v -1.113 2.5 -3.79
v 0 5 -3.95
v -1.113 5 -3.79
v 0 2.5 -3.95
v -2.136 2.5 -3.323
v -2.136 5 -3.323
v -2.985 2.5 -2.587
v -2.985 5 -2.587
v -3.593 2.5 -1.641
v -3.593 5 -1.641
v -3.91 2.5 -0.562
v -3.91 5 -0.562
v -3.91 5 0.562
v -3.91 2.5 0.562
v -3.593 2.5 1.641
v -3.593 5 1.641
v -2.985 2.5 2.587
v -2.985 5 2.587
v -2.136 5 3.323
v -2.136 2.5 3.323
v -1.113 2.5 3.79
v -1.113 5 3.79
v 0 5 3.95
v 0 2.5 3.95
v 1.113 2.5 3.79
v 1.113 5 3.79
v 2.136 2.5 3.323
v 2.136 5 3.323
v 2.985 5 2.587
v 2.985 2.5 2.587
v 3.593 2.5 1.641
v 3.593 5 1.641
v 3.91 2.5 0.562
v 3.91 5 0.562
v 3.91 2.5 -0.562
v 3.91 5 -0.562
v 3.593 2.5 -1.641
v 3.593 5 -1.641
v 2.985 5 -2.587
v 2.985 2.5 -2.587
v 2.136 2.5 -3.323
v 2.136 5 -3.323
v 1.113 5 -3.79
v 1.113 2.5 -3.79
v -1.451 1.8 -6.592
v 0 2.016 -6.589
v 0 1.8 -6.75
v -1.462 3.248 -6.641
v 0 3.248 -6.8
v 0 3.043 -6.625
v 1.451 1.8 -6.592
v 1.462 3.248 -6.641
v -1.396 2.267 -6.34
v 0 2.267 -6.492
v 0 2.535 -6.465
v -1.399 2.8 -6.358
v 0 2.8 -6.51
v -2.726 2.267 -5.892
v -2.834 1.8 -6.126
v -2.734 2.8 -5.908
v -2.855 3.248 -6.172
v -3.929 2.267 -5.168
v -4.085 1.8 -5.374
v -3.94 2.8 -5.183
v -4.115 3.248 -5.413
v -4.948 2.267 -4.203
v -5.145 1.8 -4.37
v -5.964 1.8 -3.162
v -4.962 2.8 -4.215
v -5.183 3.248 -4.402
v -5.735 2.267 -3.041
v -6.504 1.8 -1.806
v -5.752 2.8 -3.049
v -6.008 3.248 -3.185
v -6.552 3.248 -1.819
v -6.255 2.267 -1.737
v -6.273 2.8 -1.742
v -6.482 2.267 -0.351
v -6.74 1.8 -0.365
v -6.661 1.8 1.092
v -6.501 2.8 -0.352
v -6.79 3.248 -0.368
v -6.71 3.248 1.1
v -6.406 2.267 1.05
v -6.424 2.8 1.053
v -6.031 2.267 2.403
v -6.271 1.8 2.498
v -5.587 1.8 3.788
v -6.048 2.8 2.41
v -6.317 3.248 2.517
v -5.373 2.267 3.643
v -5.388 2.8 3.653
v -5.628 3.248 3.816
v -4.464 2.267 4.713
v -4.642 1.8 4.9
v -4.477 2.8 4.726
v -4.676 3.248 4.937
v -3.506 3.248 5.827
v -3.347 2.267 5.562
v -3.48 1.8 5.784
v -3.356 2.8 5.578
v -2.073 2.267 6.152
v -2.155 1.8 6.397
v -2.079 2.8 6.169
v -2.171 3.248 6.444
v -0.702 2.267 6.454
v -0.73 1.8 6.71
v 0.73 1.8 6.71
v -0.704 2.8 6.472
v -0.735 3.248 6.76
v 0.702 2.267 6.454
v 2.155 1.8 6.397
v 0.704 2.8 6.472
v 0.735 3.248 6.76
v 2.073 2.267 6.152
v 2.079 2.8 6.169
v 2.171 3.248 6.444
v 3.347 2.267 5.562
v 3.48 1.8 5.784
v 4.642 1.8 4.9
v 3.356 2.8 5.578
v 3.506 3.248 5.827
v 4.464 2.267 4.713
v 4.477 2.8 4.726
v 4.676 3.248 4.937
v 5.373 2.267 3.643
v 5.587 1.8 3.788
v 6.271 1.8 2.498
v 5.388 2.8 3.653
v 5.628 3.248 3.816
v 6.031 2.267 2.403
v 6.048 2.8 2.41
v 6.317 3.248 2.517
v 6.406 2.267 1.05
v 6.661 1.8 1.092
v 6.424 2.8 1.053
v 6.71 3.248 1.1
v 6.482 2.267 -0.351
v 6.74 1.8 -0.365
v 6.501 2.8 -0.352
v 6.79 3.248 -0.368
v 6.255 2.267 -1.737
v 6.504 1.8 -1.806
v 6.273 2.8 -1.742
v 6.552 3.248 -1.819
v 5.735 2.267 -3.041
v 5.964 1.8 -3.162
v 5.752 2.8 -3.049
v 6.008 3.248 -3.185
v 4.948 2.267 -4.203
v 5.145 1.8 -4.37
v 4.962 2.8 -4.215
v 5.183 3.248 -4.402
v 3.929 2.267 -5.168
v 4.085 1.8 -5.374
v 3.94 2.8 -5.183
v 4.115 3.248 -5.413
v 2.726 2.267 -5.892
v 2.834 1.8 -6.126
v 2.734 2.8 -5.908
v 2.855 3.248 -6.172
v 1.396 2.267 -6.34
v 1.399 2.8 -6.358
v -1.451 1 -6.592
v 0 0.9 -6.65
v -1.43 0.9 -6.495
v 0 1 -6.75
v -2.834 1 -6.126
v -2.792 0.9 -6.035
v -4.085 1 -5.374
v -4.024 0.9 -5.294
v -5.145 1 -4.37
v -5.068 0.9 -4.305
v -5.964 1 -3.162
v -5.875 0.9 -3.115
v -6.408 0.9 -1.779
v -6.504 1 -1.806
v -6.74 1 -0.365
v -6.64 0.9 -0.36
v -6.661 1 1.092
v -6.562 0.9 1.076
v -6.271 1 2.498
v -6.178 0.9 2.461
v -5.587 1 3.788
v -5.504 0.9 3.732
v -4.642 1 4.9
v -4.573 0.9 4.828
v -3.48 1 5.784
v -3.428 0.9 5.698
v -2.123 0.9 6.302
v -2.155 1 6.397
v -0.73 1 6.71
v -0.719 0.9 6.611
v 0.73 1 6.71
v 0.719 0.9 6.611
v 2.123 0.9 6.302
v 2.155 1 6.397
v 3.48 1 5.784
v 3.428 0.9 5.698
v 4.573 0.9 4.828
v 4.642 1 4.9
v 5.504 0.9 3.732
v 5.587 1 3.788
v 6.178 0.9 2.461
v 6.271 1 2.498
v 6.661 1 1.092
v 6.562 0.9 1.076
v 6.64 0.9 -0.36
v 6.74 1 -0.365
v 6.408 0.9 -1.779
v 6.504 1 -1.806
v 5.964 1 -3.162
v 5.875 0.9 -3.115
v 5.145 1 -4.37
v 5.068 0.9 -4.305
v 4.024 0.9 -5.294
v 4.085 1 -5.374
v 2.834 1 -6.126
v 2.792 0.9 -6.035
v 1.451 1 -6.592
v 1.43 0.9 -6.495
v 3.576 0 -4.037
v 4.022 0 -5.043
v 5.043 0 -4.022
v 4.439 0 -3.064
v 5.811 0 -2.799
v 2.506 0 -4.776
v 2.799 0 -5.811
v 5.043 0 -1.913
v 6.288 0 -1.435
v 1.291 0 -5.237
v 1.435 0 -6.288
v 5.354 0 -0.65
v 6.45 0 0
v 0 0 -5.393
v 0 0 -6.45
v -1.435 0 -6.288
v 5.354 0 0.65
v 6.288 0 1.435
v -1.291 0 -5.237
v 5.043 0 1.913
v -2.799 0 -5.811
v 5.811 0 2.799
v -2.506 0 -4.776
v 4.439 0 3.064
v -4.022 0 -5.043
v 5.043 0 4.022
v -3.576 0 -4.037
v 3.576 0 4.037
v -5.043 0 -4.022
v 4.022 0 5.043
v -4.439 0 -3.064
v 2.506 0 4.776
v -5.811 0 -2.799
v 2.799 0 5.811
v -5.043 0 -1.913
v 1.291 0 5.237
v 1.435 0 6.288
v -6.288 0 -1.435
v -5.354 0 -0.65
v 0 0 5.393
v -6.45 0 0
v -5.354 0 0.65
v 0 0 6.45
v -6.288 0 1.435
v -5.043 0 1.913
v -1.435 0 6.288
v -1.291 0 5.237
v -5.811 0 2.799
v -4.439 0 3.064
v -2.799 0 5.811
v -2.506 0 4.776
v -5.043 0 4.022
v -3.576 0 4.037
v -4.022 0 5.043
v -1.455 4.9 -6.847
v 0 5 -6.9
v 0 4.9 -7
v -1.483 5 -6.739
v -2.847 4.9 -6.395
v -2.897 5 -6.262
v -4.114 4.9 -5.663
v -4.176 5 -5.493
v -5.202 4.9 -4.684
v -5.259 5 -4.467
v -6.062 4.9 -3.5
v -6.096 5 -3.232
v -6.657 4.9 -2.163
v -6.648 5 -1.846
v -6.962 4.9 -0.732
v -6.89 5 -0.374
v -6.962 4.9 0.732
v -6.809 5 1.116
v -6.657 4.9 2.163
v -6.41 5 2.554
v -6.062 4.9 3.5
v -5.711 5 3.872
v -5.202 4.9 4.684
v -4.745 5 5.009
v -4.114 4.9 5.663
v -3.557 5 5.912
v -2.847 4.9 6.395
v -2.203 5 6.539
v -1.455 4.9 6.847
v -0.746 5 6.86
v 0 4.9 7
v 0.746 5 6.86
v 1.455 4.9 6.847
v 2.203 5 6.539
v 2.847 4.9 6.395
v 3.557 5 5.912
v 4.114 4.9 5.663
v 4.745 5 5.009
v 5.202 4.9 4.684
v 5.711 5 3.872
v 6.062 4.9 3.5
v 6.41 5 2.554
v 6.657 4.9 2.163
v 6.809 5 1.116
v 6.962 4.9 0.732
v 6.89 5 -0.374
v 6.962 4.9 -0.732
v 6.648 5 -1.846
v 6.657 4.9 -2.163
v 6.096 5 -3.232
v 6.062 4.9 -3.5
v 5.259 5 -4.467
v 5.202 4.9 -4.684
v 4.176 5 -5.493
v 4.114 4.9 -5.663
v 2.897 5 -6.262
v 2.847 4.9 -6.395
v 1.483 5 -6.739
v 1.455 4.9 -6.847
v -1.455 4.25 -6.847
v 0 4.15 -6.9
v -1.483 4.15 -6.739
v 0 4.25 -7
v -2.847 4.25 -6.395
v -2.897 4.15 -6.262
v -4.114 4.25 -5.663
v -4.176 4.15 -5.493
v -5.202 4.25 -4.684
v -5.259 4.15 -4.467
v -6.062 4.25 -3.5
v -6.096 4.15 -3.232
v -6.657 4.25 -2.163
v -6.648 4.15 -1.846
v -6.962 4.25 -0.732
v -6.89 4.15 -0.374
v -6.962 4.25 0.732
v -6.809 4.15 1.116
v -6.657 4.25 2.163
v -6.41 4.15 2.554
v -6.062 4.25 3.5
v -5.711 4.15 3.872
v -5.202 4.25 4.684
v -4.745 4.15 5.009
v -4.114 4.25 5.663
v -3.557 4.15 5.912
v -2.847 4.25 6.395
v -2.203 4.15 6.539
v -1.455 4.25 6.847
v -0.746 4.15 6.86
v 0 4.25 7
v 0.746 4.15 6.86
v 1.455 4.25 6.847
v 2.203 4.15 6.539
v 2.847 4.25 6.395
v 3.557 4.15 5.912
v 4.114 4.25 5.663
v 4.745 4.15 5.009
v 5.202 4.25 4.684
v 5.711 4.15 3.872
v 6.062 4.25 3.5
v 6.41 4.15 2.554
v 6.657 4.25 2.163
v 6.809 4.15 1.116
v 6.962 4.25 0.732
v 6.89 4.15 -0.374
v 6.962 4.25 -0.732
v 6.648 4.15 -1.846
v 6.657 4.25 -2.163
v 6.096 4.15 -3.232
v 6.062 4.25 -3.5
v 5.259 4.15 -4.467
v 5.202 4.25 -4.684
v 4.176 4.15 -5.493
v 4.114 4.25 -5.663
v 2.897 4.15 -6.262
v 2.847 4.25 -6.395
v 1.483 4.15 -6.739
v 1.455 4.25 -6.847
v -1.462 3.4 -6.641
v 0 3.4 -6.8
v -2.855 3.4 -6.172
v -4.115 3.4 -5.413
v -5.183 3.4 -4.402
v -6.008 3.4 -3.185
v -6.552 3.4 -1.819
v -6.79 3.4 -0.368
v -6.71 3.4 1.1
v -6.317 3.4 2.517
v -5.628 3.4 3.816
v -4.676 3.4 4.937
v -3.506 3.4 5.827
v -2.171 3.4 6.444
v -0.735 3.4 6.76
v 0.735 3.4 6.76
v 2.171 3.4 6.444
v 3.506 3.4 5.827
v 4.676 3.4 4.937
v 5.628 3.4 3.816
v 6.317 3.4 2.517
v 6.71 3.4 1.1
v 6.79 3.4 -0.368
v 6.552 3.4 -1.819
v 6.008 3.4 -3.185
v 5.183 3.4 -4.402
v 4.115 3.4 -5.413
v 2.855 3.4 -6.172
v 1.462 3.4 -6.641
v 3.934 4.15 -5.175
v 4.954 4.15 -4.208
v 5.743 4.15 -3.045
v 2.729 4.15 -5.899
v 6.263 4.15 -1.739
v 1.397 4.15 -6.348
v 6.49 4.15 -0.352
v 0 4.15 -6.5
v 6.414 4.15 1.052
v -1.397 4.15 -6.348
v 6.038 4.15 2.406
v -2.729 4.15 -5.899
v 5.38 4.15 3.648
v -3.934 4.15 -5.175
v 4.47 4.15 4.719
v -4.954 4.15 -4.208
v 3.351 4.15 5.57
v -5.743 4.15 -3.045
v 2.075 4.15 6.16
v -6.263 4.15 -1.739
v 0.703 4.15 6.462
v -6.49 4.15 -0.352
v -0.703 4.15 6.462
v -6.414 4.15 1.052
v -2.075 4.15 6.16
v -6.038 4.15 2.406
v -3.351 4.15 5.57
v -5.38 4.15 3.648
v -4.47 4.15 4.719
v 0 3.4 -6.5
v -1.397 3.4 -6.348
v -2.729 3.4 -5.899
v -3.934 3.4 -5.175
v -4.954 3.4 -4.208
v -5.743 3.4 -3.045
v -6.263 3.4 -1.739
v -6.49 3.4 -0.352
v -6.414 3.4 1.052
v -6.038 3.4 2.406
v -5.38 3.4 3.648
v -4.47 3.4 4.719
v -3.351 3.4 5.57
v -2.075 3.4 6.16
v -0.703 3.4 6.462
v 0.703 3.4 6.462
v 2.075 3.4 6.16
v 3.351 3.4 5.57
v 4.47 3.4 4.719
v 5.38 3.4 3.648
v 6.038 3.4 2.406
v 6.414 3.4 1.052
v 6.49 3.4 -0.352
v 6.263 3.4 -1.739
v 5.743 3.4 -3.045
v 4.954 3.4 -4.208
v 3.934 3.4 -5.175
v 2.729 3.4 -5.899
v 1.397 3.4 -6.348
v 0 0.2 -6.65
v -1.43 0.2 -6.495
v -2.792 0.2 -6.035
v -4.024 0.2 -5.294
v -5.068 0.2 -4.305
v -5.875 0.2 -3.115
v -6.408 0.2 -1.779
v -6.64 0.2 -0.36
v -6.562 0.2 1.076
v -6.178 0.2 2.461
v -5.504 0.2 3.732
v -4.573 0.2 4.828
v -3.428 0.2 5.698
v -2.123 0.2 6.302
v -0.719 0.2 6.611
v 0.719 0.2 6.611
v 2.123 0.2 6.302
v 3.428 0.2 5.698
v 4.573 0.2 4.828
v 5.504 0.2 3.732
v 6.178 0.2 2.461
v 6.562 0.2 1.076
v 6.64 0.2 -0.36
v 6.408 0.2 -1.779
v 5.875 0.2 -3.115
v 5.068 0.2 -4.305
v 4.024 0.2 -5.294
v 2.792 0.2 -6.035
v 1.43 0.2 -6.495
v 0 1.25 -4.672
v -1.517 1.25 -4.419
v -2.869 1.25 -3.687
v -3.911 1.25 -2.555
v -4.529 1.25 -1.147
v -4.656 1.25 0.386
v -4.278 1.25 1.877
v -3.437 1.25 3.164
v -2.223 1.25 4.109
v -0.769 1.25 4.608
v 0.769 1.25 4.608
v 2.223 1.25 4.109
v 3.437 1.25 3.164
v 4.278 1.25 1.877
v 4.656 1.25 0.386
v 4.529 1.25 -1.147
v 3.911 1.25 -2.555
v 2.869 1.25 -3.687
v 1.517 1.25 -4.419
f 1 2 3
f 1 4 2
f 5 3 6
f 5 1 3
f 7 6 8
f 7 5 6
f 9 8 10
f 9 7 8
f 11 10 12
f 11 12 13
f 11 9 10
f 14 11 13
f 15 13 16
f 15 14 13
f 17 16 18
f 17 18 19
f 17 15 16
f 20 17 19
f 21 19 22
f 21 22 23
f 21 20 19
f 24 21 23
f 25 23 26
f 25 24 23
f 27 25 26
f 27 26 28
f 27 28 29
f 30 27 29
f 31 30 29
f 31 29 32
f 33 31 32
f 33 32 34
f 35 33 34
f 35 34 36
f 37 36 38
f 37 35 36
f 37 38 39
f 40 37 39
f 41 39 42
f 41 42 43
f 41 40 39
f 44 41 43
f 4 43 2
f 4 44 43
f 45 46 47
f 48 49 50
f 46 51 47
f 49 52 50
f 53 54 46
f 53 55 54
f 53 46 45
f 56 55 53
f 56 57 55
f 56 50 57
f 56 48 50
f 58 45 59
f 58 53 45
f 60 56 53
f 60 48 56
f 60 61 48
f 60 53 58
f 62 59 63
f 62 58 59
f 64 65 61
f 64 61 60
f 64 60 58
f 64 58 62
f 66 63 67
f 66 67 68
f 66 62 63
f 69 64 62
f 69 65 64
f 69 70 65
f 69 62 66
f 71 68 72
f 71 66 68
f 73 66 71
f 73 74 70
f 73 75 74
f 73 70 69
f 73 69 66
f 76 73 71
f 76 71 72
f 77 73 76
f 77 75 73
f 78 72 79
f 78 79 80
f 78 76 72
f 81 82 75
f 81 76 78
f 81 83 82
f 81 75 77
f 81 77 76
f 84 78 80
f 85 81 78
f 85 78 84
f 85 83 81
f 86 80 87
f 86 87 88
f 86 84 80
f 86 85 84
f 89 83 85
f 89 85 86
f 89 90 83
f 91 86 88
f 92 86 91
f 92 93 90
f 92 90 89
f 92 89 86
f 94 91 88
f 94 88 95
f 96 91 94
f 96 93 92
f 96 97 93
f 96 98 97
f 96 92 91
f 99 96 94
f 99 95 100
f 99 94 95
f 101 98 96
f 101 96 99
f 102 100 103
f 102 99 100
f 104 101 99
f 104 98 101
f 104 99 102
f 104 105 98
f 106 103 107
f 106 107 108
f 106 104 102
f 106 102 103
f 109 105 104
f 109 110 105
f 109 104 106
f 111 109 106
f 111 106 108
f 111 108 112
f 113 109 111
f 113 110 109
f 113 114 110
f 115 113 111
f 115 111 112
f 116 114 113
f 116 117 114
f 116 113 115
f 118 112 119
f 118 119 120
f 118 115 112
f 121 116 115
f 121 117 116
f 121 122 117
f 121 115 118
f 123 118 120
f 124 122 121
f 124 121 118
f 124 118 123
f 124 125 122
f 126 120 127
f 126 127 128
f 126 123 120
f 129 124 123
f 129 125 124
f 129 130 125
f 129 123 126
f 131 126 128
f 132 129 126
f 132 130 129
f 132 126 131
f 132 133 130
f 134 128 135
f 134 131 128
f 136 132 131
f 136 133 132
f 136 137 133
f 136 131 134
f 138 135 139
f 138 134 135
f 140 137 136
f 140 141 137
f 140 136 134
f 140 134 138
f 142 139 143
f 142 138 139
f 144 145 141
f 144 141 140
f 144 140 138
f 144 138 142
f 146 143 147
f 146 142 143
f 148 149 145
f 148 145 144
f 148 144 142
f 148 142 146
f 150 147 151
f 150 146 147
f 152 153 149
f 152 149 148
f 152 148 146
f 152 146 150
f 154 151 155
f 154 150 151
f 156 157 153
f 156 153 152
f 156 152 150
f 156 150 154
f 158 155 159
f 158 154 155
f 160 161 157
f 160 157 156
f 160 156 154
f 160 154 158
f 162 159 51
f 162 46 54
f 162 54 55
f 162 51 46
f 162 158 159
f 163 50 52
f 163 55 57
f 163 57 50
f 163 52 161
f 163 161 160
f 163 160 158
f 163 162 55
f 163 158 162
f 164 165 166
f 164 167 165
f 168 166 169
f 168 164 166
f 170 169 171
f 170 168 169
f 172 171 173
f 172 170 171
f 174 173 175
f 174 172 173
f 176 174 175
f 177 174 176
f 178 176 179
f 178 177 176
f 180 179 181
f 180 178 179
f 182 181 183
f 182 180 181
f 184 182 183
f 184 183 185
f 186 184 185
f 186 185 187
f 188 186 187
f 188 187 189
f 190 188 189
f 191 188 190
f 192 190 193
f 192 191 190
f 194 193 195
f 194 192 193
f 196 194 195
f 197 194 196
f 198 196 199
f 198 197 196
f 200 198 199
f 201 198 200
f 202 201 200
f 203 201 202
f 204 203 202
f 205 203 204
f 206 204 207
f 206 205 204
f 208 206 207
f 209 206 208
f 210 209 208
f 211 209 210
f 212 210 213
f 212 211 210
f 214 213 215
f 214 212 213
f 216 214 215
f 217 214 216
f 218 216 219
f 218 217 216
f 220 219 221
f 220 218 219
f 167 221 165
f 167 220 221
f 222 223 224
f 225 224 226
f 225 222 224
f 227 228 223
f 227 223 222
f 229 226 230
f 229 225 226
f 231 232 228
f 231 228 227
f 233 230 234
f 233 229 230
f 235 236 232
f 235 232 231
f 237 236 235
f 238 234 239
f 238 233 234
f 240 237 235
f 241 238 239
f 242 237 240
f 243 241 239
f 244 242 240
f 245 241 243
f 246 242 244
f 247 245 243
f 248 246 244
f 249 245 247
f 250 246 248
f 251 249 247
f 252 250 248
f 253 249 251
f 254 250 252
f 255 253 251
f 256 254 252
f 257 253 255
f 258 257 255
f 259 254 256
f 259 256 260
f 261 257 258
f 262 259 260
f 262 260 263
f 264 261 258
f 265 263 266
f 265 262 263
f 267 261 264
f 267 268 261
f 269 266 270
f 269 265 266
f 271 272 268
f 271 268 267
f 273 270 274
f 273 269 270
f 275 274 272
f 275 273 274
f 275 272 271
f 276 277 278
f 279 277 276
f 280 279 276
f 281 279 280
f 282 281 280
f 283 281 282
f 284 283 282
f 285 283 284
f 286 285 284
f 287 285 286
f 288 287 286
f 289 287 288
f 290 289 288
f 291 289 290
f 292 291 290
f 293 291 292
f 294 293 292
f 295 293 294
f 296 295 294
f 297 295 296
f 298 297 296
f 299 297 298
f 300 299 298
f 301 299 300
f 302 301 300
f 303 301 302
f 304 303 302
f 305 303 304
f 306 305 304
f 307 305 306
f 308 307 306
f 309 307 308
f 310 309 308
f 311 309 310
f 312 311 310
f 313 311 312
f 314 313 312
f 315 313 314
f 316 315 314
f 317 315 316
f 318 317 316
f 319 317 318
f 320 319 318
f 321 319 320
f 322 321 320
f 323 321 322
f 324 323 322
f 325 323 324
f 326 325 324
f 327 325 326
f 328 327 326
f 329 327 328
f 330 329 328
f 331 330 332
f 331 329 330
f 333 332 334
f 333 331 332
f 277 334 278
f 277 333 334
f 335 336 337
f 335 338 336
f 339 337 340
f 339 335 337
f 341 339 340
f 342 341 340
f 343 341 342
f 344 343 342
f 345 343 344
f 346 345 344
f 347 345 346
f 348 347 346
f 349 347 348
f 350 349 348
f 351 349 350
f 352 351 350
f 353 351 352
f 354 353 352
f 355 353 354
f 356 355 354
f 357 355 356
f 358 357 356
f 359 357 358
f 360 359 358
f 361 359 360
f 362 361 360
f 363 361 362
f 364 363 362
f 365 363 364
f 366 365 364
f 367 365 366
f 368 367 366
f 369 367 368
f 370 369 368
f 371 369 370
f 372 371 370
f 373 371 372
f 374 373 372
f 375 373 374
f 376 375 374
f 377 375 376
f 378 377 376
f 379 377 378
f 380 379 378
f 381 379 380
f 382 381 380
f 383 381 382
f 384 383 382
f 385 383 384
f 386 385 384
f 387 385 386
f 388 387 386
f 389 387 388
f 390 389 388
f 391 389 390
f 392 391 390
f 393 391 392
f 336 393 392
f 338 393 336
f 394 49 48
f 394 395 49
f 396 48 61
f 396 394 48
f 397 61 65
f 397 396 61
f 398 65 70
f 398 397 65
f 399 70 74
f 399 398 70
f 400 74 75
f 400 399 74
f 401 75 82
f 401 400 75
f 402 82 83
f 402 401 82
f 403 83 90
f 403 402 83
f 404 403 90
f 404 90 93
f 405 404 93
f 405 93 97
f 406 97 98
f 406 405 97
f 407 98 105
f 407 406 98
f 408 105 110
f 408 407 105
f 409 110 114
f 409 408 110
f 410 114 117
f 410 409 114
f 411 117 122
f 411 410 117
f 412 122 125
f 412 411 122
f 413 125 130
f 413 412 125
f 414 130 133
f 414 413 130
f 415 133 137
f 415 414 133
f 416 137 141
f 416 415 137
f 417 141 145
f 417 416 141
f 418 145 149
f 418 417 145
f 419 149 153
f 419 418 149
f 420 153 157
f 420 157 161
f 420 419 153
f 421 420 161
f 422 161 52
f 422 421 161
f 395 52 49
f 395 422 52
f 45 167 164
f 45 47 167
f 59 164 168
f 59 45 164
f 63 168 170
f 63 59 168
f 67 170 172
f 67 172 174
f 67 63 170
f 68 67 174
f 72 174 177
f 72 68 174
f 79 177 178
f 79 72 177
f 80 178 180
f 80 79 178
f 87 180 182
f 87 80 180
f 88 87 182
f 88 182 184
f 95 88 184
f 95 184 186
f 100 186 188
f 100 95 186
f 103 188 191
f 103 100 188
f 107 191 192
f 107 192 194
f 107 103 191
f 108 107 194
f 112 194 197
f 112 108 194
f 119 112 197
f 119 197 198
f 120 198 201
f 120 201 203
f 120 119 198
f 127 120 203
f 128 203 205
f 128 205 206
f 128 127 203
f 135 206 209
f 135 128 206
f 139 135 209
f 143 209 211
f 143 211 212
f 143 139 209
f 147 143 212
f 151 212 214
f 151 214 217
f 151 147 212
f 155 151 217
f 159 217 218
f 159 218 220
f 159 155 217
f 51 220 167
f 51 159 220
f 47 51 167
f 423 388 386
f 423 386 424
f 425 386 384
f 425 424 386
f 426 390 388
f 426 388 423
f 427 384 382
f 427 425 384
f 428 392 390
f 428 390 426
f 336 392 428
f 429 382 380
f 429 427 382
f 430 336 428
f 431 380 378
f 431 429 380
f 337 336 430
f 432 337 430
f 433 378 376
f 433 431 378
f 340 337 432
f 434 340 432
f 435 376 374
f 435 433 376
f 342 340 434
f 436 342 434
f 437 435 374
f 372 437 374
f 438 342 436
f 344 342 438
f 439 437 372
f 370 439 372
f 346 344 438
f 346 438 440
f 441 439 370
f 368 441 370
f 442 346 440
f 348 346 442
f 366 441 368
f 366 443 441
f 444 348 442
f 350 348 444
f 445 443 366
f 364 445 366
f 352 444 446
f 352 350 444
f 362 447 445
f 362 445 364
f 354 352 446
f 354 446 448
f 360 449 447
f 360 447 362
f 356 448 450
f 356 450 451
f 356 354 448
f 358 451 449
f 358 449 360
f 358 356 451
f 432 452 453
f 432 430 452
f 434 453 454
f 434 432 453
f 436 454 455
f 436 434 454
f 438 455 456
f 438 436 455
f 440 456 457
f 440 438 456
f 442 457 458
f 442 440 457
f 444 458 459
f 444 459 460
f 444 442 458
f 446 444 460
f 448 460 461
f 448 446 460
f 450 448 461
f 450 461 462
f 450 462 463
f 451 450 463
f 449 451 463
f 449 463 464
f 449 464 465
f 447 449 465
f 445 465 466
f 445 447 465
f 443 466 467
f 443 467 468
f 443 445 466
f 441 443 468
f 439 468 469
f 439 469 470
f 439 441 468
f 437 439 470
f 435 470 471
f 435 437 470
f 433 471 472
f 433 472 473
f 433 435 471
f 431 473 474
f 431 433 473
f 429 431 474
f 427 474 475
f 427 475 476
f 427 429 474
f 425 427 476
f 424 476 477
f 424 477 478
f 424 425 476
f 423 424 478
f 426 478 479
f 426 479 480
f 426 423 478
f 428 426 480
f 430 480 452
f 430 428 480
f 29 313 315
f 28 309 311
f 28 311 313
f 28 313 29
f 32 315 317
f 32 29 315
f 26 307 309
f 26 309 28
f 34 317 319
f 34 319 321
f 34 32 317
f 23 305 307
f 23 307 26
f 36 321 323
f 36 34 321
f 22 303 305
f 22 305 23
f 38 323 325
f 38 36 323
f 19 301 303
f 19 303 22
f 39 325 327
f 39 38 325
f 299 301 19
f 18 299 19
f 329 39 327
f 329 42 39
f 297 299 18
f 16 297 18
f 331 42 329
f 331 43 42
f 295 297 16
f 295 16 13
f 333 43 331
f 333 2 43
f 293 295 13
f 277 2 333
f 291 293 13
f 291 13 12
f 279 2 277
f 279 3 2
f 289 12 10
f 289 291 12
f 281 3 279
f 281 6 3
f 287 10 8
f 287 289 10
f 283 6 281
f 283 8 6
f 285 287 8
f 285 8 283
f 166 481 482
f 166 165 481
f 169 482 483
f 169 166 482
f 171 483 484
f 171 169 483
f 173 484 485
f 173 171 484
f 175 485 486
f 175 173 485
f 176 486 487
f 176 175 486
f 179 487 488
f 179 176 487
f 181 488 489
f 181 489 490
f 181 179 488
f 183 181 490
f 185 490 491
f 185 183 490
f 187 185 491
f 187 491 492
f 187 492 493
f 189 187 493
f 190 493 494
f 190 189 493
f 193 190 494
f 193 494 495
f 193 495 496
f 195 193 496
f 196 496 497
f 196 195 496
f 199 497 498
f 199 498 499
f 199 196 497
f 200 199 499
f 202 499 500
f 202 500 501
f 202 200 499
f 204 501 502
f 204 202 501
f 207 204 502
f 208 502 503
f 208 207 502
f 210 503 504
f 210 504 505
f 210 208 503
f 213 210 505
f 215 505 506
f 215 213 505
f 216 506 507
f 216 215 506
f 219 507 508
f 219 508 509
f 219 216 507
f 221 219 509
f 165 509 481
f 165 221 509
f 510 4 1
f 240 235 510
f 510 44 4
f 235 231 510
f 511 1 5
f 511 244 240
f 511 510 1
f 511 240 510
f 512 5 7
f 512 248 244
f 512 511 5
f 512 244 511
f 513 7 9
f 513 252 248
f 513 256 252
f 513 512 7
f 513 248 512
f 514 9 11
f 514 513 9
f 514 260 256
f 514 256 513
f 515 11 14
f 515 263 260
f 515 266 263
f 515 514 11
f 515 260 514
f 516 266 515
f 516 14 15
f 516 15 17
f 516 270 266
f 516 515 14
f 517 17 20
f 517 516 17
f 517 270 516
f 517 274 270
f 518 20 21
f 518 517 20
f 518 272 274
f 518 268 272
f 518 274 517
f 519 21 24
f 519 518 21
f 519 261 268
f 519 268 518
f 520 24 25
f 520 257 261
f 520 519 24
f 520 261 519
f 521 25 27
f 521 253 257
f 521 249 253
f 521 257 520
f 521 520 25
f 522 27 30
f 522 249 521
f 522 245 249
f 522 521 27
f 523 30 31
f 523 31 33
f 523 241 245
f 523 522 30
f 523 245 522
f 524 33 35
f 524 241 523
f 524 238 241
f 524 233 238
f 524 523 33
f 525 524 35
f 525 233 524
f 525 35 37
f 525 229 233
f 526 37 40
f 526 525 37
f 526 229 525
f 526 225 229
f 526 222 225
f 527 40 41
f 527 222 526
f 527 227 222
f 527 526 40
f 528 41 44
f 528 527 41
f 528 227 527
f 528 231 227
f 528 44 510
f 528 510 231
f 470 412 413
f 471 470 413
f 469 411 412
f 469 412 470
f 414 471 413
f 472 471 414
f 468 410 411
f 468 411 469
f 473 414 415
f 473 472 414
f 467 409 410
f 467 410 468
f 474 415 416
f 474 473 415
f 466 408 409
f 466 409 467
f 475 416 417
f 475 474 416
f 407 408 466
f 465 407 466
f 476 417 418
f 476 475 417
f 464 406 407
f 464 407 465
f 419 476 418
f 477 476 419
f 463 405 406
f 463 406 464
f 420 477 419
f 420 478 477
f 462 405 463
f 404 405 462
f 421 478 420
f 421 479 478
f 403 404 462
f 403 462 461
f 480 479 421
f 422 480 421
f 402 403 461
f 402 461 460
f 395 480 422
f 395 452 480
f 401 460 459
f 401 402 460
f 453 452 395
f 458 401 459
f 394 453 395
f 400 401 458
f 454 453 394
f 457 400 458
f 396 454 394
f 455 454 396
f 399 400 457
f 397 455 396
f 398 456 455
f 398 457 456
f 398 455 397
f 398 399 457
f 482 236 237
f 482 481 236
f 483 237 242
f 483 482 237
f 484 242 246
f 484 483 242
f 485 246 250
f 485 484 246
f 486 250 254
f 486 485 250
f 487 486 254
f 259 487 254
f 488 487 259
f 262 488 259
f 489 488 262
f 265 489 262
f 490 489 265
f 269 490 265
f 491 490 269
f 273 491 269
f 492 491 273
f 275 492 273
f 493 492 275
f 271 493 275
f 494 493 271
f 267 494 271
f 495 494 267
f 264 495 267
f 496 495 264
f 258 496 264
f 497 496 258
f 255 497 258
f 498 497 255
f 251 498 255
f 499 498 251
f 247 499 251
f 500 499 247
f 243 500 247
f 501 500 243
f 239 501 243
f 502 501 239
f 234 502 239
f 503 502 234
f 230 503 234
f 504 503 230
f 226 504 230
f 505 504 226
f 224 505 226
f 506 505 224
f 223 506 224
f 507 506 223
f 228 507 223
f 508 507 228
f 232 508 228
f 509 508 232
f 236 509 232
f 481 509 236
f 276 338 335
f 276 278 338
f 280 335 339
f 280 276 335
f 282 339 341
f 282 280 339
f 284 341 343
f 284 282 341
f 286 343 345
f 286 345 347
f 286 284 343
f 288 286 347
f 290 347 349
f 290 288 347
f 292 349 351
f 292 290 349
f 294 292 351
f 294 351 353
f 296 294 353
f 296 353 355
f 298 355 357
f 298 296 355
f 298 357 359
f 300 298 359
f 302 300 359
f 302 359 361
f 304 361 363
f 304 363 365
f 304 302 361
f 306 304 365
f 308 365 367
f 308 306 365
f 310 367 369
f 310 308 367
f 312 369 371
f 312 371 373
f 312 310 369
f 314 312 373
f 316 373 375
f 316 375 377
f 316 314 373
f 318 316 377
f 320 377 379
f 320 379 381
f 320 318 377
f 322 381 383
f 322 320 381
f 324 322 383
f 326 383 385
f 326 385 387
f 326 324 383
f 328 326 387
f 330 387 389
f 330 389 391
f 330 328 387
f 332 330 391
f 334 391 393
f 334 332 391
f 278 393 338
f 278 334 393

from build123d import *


with BuildPart() as part:
    # Croquis1 → Revolución1 (revolve)
    with BuildSketch(Plane.XY, mode=Mode.PRIVATE) as revoluci_n1_sk:
        with BuildLine():
            Line((6.45, 0), (6.65, 0.2))
            Line((6.65, 0.2), (6.65, 0.9))
            Line((6.65, 0.9), (6.75, 1))
            Line((6.75, 1), (6.75, 1.667))
            Line((6.75, 1.667), (6.75, 1.8))
            ThreePointArc((6.75, 1.8), (6.46467894, 2.534577468), (6.8, 3.247719775))
            Line((6.8, 3.247719775), (6.8, 3.4))
            Line((6.8, 3.4), (6.5, 3.4))
            Line((6.5, 3.4), (6.5, 4.15))
            Line((6.5, 4.15), (6.9, 4.15))
            Line((6.9, 4.15), (7, 4.25))
            Line((7, 4.25), (7, 4.9))
            Line((7, 4.9), (6.9, 5))
            Line((6.9, 5), (3.95, 5))
            Line((3.95, 5), (3.95, 2.5))
            Line((3.95, 2.5), (5.393375673, 0))
            Line((5.393375673, 0), (6.45, 0))
        make_face()
    revolve(revoluci_n1_sk.sketch.rotate(Axis((0, 0, 0), (0, 1, 0)), 90), axis=Axis((0, 0, 0), (0, 1, 0)))


solid = part.part
